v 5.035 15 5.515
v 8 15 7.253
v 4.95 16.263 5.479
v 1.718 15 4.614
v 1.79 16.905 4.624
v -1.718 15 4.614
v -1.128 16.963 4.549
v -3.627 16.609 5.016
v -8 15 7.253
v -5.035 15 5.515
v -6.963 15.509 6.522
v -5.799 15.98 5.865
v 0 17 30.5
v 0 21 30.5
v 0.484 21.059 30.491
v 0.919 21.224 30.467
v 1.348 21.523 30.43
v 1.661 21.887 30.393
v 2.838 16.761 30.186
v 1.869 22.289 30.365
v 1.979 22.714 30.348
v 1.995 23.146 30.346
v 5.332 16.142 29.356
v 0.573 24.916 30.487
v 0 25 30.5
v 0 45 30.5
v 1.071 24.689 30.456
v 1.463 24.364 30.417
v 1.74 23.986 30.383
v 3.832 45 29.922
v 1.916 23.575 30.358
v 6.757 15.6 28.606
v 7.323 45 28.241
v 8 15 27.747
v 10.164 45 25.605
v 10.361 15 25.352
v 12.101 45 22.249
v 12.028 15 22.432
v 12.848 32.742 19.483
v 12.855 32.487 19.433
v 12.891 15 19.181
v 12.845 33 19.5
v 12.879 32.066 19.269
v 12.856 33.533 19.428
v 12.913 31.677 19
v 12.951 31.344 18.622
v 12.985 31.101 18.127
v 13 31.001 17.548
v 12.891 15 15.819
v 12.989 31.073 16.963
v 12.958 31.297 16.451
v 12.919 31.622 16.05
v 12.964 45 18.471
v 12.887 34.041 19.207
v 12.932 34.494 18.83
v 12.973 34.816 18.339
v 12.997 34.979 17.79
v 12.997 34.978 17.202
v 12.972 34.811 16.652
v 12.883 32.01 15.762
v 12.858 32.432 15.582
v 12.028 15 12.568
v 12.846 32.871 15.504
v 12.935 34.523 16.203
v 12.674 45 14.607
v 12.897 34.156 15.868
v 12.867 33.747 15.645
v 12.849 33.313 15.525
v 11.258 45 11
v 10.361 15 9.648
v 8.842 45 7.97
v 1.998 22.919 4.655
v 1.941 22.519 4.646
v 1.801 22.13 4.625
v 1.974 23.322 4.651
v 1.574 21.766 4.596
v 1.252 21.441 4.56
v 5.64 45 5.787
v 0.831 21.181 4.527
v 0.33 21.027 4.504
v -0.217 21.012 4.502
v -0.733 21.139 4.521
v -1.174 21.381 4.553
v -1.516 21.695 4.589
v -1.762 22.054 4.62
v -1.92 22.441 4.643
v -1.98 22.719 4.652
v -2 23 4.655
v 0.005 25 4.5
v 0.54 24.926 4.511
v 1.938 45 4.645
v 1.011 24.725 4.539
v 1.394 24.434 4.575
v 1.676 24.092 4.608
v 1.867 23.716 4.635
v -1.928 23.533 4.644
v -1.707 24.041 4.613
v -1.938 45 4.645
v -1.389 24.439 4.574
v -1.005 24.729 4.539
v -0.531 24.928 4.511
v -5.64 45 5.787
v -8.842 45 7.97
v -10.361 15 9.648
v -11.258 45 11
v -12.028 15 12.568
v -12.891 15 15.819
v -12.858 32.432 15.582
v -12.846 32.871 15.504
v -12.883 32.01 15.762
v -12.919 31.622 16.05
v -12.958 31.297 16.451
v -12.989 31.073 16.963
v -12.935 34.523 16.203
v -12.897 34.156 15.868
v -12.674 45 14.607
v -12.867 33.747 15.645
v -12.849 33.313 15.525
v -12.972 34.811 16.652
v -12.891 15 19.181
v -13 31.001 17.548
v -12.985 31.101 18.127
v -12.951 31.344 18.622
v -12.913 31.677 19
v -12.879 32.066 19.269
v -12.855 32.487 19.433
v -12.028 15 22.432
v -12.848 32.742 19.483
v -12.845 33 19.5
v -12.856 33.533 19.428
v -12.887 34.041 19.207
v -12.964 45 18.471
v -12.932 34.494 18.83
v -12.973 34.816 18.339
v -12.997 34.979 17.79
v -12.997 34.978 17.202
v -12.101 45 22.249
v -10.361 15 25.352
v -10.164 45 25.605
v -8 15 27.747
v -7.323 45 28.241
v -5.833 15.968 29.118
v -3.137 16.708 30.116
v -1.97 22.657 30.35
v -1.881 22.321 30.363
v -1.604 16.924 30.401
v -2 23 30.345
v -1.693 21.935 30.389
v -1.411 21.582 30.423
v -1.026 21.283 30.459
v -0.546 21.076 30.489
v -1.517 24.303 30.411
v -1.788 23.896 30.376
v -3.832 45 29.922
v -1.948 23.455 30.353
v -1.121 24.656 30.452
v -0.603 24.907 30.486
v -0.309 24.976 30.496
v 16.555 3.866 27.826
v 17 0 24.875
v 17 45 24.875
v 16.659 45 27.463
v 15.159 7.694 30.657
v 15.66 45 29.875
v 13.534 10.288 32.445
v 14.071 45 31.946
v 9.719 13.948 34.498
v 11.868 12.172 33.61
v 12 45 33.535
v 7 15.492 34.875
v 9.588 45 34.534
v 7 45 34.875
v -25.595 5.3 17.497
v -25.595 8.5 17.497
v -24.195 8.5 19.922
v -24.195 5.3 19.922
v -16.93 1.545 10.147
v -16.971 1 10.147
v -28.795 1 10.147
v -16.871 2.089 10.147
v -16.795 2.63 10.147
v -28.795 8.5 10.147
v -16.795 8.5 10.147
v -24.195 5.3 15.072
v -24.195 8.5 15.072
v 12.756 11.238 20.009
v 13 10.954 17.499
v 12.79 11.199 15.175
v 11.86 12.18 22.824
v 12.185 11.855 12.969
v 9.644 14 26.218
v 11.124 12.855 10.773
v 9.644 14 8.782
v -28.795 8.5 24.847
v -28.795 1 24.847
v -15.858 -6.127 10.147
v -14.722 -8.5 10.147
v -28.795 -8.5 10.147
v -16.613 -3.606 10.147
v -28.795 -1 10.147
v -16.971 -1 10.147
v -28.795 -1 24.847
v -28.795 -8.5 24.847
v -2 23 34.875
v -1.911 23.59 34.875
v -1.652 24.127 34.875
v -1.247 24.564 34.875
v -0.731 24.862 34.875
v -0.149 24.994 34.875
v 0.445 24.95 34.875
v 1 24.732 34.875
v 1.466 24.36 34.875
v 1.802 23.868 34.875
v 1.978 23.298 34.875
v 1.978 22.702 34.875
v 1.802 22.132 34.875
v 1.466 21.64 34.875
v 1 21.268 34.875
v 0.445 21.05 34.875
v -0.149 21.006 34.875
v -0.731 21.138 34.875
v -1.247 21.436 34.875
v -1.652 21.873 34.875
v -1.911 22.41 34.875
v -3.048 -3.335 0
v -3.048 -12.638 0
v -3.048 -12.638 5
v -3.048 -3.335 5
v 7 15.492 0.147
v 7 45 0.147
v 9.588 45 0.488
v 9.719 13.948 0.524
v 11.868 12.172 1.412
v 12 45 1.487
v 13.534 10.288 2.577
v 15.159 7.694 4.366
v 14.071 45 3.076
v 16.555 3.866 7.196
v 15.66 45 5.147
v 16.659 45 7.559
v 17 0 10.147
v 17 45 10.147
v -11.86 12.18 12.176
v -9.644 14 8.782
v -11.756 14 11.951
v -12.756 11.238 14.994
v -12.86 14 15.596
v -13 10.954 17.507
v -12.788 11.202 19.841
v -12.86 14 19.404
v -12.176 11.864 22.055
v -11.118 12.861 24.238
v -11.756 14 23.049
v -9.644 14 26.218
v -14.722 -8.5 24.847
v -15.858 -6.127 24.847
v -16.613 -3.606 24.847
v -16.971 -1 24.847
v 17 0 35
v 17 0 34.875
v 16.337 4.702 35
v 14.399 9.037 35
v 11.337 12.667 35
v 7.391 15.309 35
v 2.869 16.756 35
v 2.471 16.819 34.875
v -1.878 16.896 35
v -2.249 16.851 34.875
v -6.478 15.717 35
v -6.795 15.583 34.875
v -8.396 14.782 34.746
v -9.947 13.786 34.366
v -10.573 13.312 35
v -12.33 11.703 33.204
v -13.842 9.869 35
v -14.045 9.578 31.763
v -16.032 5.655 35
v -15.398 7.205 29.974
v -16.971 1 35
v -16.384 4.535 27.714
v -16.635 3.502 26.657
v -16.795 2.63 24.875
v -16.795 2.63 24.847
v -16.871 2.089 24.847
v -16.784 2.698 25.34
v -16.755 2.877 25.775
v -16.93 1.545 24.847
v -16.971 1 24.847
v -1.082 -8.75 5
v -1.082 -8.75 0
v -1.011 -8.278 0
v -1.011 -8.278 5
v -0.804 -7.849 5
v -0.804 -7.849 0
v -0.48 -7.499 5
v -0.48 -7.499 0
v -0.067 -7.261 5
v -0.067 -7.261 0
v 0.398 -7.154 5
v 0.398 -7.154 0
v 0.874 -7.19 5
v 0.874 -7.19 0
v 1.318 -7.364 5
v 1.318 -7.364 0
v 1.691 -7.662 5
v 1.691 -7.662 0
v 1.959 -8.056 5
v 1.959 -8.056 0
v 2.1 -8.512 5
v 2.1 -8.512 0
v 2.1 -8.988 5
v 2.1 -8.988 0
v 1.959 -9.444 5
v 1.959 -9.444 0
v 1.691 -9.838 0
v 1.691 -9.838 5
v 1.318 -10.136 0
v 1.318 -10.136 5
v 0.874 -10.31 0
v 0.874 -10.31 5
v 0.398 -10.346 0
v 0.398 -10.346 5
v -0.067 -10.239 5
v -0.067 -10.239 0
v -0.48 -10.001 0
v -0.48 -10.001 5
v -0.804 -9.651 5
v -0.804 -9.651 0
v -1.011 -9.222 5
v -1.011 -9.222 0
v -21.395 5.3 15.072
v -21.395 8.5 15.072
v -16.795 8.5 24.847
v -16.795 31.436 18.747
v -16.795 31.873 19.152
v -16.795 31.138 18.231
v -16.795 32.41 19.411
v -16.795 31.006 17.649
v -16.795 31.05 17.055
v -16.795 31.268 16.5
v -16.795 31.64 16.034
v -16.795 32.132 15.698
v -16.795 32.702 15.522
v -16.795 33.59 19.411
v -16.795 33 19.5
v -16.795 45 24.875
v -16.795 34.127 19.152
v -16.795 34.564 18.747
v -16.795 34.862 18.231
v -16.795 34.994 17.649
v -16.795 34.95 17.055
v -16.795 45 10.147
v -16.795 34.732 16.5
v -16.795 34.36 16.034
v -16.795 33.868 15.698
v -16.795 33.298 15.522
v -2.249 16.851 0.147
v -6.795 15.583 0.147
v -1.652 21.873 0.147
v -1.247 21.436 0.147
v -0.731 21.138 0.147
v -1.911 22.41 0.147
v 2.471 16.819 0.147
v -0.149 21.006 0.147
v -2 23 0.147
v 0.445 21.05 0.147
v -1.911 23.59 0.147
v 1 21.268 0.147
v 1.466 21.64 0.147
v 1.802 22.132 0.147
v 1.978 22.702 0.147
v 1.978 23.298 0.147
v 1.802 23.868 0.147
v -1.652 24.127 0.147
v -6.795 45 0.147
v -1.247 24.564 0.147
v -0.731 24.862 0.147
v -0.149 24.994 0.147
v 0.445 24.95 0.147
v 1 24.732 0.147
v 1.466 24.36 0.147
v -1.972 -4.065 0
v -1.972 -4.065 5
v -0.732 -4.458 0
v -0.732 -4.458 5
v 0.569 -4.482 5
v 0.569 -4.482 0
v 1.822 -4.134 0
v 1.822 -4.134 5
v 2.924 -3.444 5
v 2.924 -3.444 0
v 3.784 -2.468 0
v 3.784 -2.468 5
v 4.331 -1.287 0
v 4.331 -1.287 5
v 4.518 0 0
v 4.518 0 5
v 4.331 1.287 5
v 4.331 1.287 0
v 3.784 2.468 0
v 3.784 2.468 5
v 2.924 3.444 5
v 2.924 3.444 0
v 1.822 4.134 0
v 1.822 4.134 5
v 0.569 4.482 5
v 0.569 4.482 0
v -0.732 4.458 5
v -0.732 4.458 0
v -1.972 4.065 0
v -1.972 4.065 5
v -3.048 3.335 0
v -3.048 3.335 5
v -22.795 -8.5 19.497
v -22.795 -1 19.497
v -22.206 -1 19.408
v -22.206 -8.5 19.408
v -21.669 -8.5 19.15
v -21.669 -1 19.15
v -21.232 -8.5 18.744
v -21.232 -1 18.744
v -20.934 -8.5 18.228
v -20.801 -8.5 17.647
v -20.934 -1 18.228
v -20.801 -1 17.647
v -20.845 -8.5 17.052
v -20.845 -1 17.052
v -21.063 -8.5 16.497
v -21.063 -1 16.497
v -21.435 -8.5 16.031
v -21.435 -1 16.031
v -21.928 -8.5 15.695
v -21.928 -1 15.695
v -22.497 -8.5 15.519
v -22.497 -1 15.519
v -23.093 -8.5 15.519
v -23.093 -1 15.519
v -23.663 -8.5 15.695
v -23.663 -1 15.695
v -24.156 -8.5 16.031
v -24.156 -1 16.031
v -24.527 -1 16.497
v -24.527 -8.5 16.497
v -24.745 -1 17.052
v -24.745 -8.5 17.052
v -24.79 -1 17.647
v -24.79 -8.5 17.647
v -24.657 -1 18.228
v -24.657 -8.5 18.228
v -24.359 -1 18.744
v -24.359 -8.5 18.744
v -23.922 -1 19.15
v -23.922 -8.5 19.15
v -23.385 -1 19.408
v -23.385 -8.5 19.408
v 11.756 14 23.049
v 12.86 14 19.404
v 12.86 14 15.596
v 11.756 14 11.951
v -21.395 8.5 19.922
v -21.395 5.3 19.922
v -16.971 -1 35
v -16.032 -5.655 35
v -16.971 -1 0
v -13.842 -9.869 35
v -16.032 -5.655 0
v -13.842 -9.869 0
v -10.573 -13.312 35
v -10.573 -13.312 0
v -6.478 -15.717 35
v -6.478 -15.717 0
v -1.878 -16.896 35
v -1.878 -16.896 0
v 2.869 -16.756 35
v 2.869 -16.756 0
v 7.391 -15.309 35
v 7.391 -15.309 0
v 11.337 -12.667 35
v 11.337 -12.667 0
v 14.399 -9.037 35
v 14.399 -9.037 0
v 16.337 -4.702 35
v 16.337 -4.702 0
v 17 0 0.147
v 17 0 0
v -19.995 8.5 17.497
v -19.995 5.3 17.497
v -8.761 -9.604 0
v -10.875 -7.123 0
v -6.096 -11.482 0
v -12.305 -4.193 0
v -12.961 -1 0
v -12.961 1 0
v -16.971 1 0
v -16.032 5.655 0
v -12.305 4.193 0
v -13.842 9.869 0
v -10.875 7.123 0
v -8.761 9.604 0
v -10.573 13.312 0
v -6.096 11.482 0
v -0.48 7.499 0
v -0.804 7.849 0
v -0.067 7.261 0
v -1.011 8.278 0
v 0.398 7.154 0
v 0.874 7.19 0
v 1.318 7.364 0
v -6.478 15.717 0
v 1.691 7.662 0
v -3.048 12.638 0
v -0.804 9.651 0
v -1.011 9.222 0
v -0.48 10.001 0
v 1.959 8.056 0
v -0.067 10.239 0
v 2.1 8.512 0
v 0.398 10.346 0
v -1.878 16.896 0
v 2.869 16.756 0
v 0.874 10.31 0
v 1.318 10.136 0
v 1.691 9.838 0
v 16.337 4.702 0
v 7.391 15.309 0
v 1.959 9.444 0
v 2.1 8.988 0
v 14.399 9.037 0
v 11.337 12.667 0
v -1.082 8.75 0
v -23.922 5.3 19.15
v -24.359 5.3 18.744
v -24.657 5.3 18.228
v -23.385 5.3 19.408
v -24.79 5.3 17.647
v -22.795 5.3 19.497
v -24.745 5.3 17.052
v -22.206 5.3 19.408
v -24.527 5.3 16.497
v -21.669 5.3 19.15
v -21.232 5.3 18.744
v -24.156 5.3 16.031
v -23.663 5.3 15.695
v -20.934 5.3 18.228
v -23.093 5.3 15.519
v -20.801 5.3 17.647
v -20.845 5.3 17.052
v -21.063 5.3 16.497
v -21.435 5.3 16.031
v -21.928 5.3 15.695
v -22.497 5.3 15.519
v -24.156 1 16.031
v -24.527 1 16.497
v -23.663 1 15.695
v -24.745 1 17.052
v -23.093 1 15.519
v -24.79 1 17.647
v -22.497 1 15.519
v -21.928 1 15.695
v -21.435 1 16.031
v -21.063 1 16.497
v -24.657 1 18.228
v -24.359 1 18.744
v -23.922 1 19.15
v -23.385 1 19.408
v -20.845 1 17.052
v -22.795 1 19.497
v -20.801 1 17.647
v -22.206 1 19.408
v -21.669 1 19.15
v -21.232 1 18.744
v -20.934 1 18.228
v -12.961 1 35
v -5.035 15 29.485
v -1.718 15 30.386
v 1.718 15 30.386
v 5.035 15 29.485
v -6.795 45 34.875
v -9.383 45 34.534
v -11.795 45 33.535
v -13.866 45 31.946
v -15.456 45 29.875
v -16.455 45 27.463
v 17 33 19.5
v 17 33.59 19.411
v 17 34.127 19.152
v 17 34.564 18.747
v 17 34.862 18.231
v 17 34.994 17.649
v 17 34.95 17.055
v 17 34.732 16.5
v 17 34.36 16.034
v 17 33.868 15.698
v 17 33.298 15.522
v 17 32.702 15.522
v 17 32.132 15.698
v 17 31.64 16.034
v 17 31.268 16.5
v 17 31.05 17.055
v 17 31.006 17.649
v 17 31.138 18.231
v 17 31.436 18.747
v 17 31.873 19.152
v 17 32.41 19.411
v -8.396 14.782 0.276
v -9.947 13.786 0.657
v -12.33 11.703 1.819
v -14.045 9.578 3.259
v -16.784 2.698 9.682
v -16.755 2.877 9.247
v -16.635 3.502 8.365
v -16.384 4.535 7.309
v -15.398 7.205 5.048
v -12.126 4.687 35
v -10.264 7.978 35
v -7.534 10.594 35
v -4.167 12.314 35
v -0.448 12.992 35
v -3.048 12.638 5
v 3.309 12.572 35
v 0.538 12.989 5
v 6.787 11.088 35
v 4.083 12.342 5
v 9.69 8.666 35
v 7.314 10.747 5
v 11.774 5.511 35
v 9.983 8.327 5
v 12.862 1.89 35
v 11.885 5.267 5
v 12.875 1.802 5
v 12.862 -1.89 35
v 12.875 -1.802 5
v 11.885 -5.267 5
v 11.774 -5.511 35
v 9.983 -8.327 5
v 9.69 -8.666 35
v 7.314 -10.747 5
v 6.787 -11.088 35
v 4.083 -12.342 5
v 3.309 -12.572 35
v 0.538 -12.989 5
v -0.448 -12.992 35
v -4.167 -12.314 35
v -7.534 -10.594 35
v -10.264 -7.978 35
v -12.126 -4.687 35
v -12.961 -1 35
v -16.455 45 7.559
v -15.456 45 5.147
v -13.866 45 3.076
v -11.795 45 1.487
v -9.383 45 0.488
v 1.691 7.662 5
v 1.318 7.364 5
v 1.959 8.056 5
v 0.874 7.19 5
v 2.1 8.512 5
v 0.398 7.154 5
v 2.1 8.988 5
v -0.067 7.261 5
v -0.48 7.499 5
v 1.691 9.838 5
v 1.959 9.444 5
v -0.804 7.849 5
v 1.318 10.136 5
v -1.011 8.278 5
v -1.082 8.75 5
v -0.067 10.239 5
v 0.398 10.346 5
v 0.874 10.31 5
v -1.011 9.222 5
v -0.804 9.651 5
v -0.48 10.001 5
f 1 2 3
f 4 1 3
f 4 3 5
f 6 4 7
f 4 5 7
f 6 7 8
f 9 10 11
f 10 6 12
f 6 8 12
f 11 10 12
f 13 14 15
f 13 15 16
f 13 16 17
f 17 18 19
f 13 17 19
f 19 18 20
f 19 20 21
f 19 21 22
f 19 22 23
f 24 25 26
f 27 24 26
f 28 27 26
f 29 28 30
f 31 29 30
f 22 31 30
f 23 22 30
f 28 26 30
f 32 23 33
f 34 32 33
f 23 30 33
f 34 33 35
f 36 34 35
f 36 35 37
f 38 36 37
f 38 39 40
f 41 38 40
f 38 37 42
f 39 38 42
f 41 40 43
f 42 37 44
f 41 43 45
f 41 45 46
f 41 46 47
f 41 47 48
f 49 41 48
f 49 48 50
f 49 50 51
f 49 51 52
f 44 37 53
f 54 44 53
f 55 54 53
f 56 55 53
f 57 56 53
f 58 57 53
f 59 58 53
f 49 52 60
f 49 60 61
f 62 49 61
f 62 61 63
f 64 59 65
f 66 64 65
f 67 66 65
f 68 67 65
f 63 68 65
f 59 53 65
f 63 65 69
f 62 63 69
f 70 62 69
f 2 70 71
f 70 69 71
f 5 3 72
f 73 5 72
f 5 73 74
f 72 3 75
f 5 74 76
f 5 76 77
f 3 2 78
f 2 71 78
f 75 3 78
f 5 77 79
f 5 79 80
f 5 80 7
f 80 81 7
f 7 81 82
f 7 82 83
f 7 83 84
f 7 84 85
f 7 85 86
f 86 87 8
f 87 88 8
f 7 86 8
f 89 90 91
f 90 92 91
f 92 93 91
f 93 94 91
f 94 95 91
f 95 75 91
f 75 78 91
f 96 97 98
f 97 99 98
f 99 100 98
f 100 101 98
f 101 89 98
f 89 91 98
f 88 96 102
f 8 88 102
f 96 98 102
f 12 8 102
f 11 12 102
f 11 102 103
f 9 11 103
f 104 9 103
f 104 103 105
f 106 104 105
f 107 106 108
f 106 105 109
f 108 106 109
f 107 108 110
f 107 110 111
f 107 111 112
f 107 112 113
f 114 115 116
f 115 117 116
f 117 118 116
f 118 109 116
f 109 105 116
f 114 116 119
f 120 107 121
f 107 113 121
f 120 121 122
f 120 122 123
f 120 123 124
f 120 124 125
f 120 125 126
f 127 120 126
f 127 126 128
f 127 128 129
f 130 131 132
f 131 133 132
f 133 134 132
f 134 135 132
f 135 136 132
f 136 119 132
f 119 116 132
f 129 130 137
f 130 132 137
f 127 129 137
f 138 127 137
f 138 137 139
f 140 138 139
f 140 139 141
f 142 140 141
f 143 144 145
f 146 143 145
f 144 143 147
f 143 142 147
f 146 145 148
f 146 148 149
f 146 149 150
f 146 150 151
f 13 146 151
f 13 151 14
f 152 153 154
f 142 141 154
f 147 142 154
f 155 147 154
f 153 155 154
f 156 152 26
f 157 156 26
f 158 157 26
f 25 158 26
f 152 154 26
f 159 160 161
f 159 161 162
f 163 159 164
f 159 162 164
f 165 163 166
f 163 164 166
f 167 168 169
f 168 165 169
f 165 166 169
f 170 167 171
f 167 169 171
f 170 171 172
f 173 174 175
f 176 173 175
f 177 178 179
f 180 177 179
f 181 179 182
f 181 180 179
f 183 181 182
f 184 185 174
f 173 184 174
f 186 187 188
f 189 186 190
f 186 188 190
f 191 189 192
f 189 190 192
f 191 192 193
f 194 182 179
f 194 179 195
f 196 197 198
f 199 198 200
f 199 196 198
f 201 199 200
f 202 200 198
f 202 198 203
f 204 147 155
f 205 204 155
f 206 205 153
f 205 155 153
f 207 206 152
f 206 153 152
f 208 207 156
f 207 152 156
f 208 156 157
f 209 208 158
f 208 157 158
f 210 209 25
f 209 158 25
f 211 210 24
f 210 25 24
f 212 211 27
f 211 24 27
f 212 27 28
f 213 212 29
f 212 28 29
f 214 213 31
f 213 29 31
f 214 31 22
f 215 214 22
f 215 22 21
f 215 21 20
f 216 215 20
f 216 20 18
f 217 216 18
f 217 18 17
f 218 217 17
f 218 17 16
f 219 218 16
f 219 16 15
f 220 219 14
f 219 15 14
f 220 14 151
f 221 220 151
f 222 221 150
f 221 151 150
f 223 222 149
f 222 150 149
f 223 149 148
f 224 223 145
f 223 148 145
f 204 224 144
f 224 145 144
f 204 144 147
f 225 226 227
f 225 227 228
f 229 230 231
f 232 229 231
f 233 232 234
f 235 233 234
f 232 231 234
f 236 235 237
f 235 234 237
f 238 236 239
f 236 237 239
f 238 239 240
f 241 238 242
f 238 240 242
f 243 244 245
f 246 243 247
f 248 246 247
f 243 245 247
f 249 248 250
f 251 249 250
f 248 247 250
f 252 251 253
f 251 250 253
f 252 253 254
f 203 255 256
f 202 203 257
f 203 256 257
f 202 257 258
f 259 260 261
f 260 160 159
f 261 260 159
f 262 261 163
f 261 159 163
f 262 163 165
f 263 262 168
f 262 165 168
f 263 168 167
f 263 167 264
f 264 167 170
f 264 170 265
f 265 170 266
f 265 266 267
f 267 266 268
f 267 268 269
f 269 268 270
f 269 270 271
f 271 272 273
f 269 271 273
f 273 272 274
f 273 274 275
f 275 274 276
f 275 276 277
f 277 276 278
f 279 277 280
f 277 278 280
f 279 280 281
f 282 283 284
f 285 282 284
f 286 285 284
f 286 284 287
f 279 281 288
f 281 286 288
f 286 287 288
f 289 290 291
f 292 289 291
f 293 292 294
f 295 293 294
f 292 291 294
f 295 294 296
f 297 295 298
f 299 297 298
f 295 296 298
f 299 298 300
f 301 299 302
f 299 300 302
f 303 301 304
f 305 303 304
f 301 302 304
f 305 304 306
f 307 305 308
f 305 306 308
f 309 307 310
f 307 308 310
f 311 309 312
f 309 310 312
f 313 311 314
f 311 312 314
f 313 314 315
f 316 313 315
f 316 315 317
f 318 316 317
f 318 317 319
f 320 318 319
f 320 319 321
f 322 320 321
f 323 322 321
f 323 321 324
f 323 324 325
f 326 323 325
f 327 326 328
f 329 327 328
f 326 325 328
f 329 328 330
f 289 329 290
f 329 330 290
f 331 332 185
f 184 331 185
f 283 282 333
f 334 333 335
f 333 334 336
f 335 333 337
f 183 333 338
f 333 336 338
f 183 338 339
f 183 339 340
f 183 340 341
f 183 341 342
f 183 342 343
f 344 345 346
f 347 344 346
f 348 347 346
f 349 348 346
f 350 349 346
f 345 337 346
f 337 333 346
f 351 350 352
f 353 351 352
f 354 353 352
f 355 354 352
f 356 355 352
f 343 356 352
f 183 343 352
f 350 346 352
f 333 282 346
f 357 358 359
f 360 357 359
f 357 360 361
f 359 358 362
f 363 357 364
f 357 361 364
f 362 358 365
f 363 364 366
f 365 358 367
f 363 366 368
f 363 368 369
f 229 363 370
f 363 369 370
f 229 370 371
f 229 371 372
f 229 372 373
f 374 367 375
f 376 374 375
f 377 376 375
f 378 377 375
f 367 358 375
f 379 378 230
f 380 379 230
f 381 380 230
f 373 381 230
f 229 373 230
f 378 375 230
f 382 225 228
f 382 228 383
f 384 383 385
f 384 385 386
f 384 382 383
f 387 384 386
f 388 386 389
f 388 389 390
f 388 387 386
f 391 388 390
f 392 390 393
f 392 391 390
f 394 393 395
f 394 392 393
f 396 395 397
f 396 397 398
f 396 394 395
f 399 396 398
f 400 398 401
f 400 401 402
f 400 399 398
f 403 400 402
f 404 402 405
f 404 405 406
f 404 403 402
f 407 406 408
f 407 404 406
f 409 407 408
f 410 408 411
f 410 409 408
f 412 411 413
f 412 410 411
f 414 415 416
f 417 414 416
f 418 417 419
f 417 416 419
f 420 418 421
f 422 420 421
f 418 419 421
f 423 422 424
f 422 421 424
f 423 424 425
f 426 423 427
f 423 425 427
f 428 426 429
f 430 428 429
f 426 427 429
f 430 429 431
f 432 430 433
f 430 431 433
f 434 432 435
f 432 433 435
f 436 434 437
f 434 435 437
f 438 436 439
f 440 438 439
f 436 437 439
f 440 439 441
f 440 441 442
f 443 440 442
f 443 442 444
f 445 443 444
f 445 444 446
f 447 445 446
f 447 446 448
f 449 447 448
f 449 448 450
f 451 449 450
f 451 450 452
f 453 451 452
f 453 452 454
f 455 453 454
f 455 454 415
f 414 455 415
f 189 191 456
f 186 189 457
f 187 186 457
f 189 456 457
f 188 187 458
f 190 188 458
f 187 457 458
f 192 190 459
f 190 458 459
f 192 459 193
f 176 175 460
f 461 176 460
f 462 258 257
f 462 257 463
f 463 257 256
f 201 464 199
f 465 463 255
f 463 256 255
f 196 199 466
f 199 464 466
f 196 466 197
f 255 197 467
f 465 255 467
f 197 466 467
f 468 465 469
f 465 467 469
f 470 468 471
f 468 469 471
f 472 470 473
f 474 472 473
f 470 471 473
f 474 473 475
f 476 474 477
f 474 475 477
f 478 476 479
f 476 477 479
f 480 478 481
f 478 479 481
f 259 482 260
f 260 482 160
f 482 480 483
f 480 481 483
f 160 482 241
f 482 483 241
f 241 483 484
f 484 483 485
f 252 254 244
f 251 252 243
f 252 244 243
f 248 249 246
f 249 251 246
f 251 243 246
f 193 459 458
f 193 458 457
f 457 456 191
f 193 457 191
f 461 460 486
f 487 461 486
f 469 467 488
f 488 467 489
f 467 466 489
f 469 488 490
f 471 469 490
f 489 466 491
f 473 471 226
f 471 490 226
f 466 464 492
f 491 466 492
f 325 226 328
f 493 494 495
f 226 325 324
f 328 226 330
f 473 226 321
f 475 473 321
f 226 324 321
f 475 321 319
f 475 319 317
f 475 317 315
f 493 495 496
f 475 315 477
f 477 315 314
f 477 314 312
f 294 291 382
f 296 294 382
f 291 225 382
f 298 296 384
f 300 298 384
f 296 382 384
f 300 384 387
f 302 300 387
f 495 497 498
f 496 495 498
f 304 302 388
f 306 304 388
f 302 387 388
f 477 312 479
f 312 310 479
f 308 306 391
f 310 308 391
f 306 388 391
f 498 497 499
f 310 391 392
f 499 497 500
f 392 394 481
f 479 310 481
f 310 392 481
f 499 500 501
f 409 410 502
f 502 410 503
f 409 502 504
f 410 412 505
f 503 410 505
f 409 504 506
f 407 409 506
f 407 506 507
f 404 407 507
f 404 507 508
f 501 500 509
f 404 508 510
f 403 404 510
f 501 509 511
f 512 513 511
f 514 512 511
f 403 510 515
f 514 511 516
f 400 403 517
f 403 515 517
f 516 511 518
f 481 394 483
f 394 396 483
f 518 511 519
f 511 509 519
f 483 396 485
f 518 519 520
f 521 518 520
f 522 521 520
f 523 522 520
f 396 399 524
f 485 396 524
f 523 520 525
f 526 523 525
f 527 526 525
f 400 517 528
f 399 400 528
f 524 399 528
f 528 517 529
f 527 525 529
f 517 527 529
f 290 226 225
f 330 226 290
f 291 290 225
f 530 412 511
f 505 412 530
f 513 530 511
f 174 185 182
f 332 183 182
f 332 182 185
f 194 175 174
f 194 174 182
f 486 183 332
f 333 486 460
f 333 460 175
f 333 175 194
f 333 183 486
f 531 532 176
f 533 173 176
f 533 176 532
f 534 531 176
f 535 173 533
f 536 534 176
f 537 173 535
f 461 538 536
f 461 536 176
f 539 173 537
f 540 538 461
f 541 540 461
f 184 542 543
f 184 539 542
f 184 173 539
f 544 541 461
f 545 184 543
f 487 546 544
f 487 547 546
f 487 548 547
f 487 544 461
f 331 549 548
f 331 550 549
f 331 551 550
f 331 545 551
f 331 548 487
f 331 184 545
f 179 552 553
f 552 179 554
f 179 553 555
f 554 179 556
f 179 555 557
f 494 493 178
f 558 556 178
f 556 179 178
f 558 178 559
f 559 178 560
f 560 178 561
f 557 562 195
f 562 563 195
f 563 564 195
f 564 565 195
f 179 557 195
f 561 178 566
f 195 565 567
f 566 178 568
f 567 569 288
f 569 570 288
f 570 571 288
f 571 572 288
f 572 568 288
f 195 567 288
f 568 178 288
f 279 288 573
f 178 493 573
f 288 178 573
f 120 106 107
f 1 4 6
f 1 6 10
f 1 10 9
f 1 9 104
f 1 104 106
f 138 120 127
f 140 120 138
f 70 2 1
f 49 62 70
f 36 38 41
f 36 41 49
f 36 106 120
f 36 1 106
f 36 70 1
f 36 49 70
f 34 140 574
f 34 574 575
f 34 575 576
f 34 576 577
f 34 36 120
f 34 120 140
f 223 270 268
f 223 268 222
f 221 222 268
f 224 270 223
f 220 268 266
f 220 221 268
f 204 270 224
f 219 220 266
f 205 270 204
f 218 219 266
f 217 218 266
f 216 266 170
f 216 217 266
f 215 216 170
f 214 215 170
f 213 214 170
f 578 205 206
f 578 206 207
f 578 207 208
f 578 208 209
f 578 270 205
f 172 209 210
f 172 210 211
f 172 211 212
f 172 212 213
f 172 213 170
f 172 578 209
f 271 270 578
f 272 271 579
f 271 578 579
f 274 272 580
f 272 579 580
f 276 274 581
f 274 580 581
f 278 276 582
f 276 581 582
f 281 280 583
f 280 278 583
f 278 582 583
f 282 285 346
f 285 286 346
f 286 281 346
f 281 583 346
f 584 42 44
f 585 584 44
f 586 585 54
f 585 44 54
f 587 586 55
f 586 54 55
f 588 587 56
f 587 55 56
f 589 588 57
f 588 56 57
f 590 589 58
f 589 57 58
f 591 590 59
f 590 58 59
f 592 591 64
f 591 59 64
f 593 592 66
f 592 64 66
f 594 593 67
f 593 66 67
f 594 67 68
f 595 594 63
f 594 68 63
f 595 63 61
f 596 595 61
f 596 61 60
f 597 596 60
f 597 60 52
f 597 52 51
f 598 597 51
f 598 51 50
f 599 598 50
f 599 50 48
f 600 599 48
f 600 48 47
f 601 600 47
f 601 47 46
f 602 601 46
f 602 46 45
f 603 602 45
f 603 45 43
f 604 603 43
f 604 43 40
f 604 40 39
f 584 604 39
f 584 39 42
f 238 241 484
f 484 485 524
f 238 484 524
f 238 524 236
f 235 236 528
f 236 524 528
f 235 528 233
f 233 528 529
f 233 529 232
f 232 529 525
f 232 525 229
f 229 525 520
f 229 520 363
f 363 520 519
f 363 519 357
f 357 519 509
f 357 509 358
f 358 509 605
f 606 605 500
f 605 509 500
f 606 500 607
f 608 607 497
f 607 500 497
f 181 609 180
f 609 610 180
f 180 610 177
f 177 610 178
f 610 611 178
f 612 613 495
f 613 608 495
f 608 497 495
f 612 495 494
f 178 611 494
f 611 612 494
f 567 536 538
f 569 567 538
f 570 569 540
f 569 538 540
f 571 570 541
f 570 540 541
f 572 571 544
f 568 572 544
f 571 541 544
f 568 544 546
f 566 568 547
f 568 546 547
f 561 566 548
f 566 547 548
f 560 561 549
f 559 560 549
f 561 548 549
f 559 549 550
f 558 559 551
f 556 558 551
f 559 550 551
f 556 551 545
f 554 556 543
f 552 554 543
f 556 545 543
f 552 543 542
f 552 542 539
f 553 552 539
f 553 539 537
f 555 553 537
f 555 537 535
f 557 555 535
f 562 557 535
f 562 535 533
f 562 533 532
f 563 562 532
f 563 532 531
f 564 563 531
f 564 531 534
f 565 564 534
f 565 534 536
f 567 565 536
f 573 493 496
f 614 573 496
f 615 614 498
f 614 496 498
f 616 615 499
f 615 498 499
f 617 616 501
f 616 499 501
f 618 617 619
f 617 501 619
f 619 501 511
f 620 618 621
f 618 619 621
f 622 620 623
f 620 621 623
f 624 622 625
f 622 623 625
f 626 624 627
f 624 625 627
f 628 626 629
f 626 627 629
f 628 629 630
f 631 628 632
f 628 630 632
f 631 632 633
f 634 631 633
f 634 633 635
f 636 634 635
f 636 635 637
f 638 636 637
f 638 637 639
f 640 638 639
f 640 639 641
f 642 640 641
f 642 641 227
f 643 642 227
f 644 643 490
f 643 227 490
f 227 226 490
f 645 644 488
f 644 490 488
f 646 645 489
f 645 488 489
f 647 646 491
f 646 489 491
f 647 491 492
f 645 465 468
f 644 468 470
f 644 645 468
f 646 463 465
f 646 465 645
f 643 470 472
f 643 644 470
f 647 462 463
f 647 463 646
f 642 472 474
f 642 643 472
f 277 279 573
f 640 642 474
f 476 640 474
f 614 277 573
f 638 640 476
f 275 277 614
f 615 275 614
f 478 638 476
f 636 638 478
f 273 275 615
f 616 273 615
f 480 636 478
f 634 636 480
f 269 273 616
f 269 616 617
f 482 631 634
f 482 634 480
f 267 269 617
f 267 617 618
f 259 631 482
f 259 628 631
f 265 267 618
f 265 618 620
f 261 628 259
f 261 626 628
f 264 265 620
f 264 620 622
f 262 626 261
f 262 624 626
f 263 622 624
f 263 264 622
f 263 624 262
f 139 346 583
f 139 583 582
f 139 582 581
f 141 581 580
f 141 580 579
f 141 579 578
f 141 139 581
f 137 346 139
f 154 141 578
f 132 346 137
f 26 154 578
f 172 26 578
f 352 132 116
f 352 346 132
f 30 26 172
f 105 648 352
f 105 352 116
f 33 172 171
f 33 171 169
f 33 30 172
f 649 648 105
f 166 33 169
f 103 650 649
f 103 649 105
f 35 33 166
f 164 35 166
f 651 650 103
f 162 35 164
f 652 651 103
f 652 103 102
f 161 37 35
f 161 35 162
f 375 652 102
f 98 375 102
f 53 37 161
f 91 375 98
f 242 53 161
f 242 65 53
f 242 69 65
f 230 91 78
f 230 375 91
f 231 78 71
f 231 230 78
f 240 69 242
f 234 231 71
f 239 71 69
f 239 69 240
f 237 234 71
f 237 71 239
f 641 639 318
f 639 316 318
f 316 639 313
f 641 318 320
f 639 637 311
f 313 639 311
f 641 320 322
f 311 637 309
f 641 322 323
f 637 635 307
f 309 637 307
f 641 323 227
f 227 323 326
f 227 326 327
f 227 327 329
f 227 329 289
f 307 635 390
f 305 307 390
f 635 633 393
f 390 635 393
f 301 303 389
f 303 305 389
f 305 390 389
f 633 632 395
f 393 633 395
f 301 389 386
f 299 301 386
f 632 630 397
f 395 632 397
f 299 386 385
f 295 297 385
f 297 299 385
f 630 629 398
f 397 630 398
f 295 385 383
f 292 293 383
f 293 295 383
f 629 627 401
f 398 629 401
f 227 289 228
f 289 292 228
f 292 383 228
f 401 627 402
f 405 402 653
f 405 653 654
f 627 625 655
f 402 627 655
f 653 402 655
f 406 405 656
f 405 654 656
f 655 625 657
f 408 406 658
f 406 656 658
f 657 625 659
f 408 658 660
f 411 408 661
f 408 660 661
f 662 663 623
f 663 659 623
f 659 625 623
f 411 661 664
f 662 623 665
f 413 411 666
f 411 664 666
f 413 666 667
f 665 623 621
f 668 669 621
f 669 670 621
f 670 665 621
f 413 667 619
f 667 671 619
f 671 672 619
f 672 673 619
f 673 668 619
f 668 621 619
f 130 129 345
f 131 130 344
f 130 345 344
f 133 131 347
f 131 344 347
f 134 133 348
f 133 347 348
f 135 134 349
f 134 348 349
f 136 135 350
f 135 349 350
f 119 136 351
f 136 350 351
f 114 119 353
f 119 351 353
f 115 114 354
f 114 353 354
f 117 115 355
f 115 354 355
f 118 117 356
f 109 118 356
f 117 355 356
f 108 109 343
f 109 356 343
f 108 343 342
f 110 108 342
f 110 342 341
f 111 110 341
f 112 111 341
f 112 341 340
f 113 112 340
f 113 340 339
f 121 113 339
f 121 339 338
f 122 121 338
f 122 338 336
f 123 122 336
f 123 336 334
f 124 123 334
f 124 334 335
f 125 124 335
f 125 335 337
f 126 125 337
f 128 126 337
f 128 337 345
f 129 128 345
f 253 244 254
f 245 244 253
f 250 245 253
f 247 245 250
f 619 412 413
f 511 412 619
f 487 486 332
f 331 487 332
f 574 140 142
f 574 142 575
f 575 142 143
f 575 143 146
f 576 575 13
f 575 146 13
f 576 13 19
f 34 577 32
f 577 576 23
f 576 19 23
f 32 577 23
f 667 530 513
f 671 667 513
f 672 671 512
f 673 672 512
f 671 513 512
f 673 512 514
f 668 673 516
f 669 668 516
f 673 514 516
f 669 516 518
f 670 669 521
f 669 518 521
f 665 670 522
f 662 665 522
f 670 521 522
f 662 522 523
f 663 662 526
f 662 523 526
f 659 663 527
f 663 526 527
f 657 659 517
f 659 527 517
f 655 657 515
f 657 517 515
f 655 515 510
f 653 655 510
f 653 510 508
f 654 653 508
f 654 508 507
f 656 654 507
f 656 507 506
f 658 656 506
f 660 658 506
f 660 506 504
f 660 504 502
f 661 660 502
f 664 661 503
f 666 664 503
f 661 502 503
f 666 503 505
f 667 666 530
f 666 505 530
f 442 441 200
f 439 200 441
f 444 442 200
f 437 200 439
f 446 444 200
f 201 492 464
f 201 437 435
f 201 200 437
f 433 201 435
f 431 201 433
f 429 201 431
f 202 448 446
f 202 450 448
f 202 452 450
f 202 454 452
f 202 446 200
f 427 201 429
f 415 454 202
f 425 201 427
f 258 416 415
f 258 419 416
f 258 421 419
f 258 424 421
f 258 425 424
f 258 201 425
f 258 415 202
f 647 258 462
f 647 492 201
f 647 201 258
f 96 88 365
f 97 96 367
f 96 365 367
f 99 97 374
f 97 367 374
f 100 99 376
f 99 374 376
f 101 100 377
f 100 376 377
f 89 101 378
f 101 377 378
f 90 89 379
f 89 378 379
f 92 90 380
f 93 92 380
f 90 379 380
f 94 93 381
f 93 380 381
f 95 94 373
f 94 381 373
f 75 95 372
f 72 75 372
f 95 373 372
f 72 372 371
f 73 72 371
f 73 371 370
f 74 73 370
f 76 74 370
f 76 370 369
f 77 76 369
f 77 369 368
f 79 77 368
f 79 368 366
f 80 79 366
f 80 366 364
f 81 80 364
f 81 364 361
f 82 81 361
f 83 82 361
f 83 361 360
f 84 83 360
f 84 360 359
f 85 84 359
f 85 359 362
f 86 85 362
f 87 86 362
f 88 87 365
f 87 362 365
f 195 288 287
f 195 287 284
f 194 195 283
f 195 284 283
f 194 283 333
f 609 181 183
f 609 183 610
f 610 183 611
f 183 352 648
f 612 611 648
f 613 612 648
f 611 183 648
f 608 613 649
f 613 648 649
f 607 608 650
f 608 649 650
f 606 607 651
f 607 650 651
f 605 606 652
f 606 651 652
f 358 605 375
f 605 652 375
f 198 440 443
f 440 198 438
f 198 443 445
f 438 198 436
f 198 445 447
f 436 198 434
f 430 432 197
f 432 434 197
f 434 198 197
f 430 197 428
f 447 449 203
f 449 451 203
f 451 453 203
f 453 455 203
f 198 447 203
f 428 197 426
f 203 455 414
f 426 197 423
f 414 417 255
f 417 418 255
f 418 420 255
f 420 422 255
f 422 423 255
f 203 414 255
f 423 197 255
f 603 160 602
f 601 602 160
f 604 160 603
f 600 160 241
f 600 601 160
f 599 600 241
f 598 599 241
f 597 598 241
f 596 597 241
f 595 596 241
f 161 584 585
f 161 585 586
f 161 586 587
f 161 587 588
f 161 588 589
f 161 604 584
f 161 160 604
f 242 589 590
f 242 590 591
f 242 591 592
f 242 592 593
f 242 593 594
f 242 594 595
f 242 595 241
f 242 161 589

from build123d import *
from build123d.topology import SkipClean

# Parameters (mm, degrees)
SKETCH_1_R                            = 17
SKETCH_1_R_2                          = 12
EXTRUDE_2_DEPTH                       = 35
SKETCH_3_W                            = 33.795275063
SKETCH_3_H                            = 34.72803434
SKETCH_3_R                            = 13
EXTRUDE_7_DEPTH                       = 45
SKETCH_4_R                            = 13
CUT_EXTRUDE_1_DEPTH                   = 60.489495005
SKETCH_12_R                           = 2
CUT_EXTRUDE_11_DEPTH                  = 45
SKETCH_15_R                           = 2
CUT_EXTRUDE_12_DEPTH                  = 45
FILLET_4_R                            = 10
SKETCH_20_R                           = 13
CUT_EXTRUDE_18_DEPTH                  = 31
EXTRUDE_START                         = 1
SKETCH_25_R                           = 13
EXTRUDE_10_DEPTH                      = 1
CUT_EXTRUDE_19_REACH                  = 68.273
CUT_EXTRUDE_19_END_RADIUS             = 13
SKETCH_26_W                           = 35
SKETCH_26_H                           = 2
CUT_EXTRUDE_19_DIRECTION_2_REACH      = 68.273
CUT_EXTRUDE_19_DIRECTION_2_END_RADIUS = 17
EXTRUDE_11_DEPTH                      = 12
EXTRUDE_11_DEPTH_BACK                 = 3
SKETCH_27_W                           = 14.7
SKETCH_27_H                           = 7.5
EXTRUDE_12_DEPTH                      = 5
SKETCH_30_R                           = 1.6
CUT_EXTRUDE_21_DEPTH                  = 5
CUT_EXTRUDE_22_DEPTH                  = 3.2
SKETCH_34_R                           = 2
CUT_EXTRUDE_23_DEPTH                  = 59.192936687


with BuildPart() as part:
    # Эскиз1 → Бобышка-Вытянуть2 (new body)
    with BuildSketch(Plane.XY):
        Circle(SKETCH_1_R)
        Circle(SKETCH_1_R_2, mode=Mode.SUBTRACT)
    extrude(amount=EXTRUDE_2_DEPTH)

    # Эскиз3 → Бобышка-Вытянуть7 (add)
    with BuildSketch(Plane(origin=(0, 45, 0), x_dir=(1, 0, 0), z_dir=(0, 1, 0))):
        with Locations((0.102362468, -17.511098906)):
            Rectangle(SKETCH_3_W, SKETCH_3_H)
        with Locations(Location((0, -17.5, 0), (0, 0, 270))):
            Circle(SKETCH_3_R, mode=Mode.SUBTRACT)
    extrude(amount=-EXTRUDE_7_DEPTH)

    # Эскиз4 → Вырез-Вытянуть1 (cut, through all)
    with BuildSketch(Plane(origin=(0, 0, 0), x_dir=(-1, 0, 0), z_dir=(0, 0, -1))):
        Circle(SKETCH_4_R)
    extrude(amount=-CUT_EXTRUDE_1_DEPTH, mode=Mode.SUBTRACT)

    # Эскиз12 → Вырез-Вытянуть11 (cut)
    with BuildSketch(Plane(origin=(0, 0, 0), x_dir=(-1, 0, 0), z_dir=(0, 0, -1))):
        with Locations((0, 23)):
            Circle(SKETCH_12_R)
    extrude(amount=-CUT_EXTRUDE_11_DEPTH, mode=Mode.SUBTRACT)

    # Эскиз15 → Вырез-Вытянуть12 (cut)
    with BuildSketch(Plane.ZY.offset(16.795275063)):
        with Locations((17.5, 33)):
            Circle(SKETCH_15_R)
    extrude(amount=-CUT_EXTRUDE_12_DEPTH, mode=Mode.SUBTRACT)

    # Скругление4
    # the kernel refuses this fillet: 10 mm, written as the material it takes off along each edge
    with BuildSketch(Plane(origin=(-16.795275063, 70, 34.875116076), x_dir=(1, 0, 0), z_dir=(0, -1, 0))) as fillet_4_piece_1_section:
        with BuildLine():
            CenterArc((FILLET_4_R, -FILLET_4_R), FILLET_4_R, 90, 90)
            Line((0, -FILLET_4_R), (0, 0))
            Line((0, 0), (FILLET_4_R, 0))
        make_face()
    fillet_4_piece_1 = extrude(amount=92.369651061, mode=Mode.PRIVATE)
    fillet_4_piece_1 = fillet_4_piece_1 - Plane(origin=(0, 0, 32.54483178), x_dir=(1, 0, 0), z_dir=(0, 0, -1)) * Cylinder(17, 225, mode=Mode.PRIVATE)
    add(fillet_4_piece_1, mode=Mode.SUBTRACT)
    with BuildSketch(Plane(origin=(17, 70, 0.147081736), x_dir=(0, 0, 1), z_dir=(0, -1, 0))) as fillet_4_piece_2_section:
        with BuildLine():
            CenterArc((FILLET_4_R, FILLET_4_R), FILLET_4_R, 180, 90)
            Line((0, FILLET_4_R), (0, 0))
            Line((0, 0), (FILLET_4_R, 0))
        make_face()
    fillet_4_piece_2 = extrude(amount=95, mode=Mode.PRIVATE)
    fillet_4_piece_2 = fillet_4_piece_2 - Plane(origin=(0, 0, 2.486350956), x_dir=(1, 0, 0), z_dir=(0, 0, -1)) * Cylinder(17, 230, mode=Mode.PRIVATE)
    add(fillet_4_piece_2, mode=Mode.SUBTRACT)
    with BuildSketch(Plane(origin=(17, 70, 34.875116076), x_dir=(0, 0, -1), z_dir=(0, -1, 0))) as fillet_4_piece_3_section:
        with BuildLine():
            CenterArc((FILLET_4_R, -FILLET_4_R), FILLET_4_R, 90, 90)
            Line((0, -FILLET_4_R), (0, 0))
            Line((0, 0), (FILLET_4_R, 0))
        make_face()
    fillet_4_piece_3 = extrude(amount=95, mode=Mode.PRIVATE)
    fillet_4_piece_3 = fillet_4_piece_3 - Plane(origin=(0, 0, 32.535846855), x_dir=(1, 0, 0), z_dir=(0, 0, -1)) * Cylinder(17, 230, mode=Mode.PRIVATE)
    add(fillet_4_piece_3, mode=Mode.SUBTRACT)
    with BuildSketch(Plane(origin=(-16.795275063, 70, 0.147081736), x_dir=(0, 0, 1), z_dir=(0, -1, 0))) as fillet_4_piece_4_section:
        with BuildLine():
            CenterArc((FILLET_4_R, -FILLET_4_R), FILLET_4_R, 90, 90)
            Line((0, -FILLET_4_R), (0, 0))
            Line((0, 0), (FILLET_4_R, 0))
        make_face()
    fillet_4_piece_4 = extrude(amount=92.369651061, mode=Mode.PRIVATE)
    fillet_4_piece_4 = fillet_4_piece_4 - Plane(origin=(0, 0, 2.477367304), x_dir=(1, 0, 0), z_dir=(0, 0, -1)) * Cylinder(17, 225, mode=Mode.PRIVATE)
    add(fillet_4_piece_4, mode=Mode.SUBTRACT)

    # Эскиз20 → Вырез-Вытянуть18 (cut)
    with SkipClean():  # the faces are left unmerged after this step: merging them gives an invalid solid
        with BuildSketch(Plane(origin=(0, 45, 0), x_dir=(1, 0, 0), z_dir=(0, 1, 0))):
            with Locations(Location((0, -17.5, 0), (0, 0, 270))):
                Circle(SKETCH_20_R)
        extrude(amount=-CUT_EXTRUDE_18_DEPTH, mode=Mode.SUBTRACT)

    # Эскиз25 → Бобышка-Вытянуть10 (add)
    with BuildSketch(Plane(origin=(0, 14, 0), x_dir=(1, 0, 0), z_dir=(0, 1, 0)).offset(EXTRUDE_START)):
        with Locations(Location((0, -17.5, 0), (0, 0, 270))):
            Circle(SKETCH_25_R)
    extrude(amount=-EXTRUDE_10_DEPTH)

    # Вырез-Вытянуть19: up to this cylinder (the profile starts outside it)
    cut_extrude_19_end = Plane(origin=(0, 0, 17.5), z_dir=(0, 0, -1)) * Cylinder(CUT_EXTRUDE_19_END_RADIUS, 163.546, mode=Mode.PRIVATE)
    # Эскиз26 → Вырез-Вытянуть19 (cut, up to the surface)
    with BuildSketch(Plane.ZY.offset(16.795275063), mode=Mode.PRIVATE) as cut_extrude_19_sk1:
        with Locations((17.5, 0)):
            Rectangle(SKETCH_26_W, SKETCH_26_H)
    cut_extrude_19_tool1 = extrude(cut_extrude_19_sk1.sketch, amount=-CUT_EXTRUDE_19_REACH, mode=Mode.PRIVATE) - cut_extrude_19_end
    add(cut_extrude_19_tool1.solids().sort_by_distance((-16.795275, 0, 17.5))[0], mode=Mode.SUBTRACT)

    # Вырез-Вытянуть19 direction 2: up to this cylinder (the profile starts inside it)
    cut_extrude_19_direction_2_end = Plane(origin=(0, 0, 17.5), z_dir=(0, 0, -1)) * Cylinder(CUT_EXTRUDE_19_DIRECTION_2_END_RADIUS, 171.546, mode=Mode.PRIVATE)
    # Эскиз26 → Вырез-Вытянуть19 direction 2 (cut, up to the surface)
    with BuildSketch(Plane.ZY.offset(16.795275063), mode=Mode.PRIVATE) as cut_extrude_19_direction_2_sk1:
        with Locations((17.5, 0)):
            Rectangle(SKETCH_26_W, SKETCH_26_H)
    cut_extrude_19_direction_2_tool1 = extrude(cut_extrude_19_direction_2_sk1.sketch, amount=CUT_EXTRUDE_19_DIRECTION_2_REACH, mode=Mode.PRIVATE) & cut_extrude_19_direction_2_end
    add(cut_extrude_19_direction_2_tool1.solids().sort_by_distance((-16.795275, 0, 17.5))[0], mode=Mode.SUBTRACT)

    # Эскиз27 → Бобышка-Вытянуть11 (add, two sides: drawn at the far end of the back side and taken through both)
    with BuildSketch(Plane.ZY.offset(16.795275063).offset(-EXTRUDE_11_DEPTH_BACK)):
        with Locations((17.497081736, 4.75)):
            Rectangle(SKETCH_27_W, SKETCH_27_H)
        with Locations((17.497081736, -4.75)):
            Rectangle(SKETCH_27_W, SKETCH_27_H)
    extrude(amount=EXTRUDE_11_DEPTH + EXTRUDE_11_DEPTH_BACK)

    # Эскиз29 → Бобышка-Вытянуть12 (add)
    with BuildSketch(Plane(origin=(0, 0, 0), x_dir=(-1, 0, 0), z_dir=(0, 0, -1))):
        with BuildLine():
            Line((3.04805277, -12.647504667), (3.04805277, -3.334582187))
            ThreePointArc((3.04805277, -3.334582187), (-4.517749888, 0), (3.04805277, 3.334582187))
            Line((3.04805277, 3.334582187), (3.04805277, 12.647504667))
            ThreePointArc((3.04805277, 12.647504667), (-13.009611831, 0), (3.04805277, -12.647504667))
        make_face()
    extrude(amount=-EXTRUDE_12_DEPTH)

    # Эскиз30 → Вырез-Вытянуть21 (cut)
    with BuildSketch(Plane(origin=(0, 0, 0), x_dir=(-1, 0, 0), z_dir=(0, 0, -1))):
        with Locations((-0.517749888, -8.75)):
            Circle(SKETCH_30_R)
        with Locations((-0.517749888, 8.75)):
            Circle(SKETCH_30_R)
    extrude(amount=-CUT_EXTRUDE_21_DEPTH, mode=Mode.SUBTRACT)

    # Эскиз28 → Вырез-Вытянуть22 (cut)
    with BuildSketch(Plane(origin=(0, 8.5, 0), x_dir=(1, 0, 0), z_dir=(0, 1, 0))):
        Polygon((-25.595275063, -17.497081736), (-24.195275063, -19.921952866), (-21.395275063, -19.921952866), (-19.995275063, -17.497081736), (-21.395275063, -15.072210605), (-24.195275063, -15.072210605), align=None)
    extrude(amount=-CUT_EXTRUDE_22_DEPTH, mode=Mode.SUBTRACT)

    # Эскиз34 → Вырез-Вытянуть23 (cut, through all)
    with BuildSketch(Plane(origin=(0, 8.5, 0), x_dir=(1, 0, 0), z_dir=(0, 1, 0))):
        with Locations(Location((-22.795275063, -17.497081736, 0), (0, 0, 270))):
            Circle(SKETCH_34_R)
    extrude(amount=-CUT_EXTRUDE_23_DEPTH, mode=Mode.SUBTRACT)


solid = part.part
